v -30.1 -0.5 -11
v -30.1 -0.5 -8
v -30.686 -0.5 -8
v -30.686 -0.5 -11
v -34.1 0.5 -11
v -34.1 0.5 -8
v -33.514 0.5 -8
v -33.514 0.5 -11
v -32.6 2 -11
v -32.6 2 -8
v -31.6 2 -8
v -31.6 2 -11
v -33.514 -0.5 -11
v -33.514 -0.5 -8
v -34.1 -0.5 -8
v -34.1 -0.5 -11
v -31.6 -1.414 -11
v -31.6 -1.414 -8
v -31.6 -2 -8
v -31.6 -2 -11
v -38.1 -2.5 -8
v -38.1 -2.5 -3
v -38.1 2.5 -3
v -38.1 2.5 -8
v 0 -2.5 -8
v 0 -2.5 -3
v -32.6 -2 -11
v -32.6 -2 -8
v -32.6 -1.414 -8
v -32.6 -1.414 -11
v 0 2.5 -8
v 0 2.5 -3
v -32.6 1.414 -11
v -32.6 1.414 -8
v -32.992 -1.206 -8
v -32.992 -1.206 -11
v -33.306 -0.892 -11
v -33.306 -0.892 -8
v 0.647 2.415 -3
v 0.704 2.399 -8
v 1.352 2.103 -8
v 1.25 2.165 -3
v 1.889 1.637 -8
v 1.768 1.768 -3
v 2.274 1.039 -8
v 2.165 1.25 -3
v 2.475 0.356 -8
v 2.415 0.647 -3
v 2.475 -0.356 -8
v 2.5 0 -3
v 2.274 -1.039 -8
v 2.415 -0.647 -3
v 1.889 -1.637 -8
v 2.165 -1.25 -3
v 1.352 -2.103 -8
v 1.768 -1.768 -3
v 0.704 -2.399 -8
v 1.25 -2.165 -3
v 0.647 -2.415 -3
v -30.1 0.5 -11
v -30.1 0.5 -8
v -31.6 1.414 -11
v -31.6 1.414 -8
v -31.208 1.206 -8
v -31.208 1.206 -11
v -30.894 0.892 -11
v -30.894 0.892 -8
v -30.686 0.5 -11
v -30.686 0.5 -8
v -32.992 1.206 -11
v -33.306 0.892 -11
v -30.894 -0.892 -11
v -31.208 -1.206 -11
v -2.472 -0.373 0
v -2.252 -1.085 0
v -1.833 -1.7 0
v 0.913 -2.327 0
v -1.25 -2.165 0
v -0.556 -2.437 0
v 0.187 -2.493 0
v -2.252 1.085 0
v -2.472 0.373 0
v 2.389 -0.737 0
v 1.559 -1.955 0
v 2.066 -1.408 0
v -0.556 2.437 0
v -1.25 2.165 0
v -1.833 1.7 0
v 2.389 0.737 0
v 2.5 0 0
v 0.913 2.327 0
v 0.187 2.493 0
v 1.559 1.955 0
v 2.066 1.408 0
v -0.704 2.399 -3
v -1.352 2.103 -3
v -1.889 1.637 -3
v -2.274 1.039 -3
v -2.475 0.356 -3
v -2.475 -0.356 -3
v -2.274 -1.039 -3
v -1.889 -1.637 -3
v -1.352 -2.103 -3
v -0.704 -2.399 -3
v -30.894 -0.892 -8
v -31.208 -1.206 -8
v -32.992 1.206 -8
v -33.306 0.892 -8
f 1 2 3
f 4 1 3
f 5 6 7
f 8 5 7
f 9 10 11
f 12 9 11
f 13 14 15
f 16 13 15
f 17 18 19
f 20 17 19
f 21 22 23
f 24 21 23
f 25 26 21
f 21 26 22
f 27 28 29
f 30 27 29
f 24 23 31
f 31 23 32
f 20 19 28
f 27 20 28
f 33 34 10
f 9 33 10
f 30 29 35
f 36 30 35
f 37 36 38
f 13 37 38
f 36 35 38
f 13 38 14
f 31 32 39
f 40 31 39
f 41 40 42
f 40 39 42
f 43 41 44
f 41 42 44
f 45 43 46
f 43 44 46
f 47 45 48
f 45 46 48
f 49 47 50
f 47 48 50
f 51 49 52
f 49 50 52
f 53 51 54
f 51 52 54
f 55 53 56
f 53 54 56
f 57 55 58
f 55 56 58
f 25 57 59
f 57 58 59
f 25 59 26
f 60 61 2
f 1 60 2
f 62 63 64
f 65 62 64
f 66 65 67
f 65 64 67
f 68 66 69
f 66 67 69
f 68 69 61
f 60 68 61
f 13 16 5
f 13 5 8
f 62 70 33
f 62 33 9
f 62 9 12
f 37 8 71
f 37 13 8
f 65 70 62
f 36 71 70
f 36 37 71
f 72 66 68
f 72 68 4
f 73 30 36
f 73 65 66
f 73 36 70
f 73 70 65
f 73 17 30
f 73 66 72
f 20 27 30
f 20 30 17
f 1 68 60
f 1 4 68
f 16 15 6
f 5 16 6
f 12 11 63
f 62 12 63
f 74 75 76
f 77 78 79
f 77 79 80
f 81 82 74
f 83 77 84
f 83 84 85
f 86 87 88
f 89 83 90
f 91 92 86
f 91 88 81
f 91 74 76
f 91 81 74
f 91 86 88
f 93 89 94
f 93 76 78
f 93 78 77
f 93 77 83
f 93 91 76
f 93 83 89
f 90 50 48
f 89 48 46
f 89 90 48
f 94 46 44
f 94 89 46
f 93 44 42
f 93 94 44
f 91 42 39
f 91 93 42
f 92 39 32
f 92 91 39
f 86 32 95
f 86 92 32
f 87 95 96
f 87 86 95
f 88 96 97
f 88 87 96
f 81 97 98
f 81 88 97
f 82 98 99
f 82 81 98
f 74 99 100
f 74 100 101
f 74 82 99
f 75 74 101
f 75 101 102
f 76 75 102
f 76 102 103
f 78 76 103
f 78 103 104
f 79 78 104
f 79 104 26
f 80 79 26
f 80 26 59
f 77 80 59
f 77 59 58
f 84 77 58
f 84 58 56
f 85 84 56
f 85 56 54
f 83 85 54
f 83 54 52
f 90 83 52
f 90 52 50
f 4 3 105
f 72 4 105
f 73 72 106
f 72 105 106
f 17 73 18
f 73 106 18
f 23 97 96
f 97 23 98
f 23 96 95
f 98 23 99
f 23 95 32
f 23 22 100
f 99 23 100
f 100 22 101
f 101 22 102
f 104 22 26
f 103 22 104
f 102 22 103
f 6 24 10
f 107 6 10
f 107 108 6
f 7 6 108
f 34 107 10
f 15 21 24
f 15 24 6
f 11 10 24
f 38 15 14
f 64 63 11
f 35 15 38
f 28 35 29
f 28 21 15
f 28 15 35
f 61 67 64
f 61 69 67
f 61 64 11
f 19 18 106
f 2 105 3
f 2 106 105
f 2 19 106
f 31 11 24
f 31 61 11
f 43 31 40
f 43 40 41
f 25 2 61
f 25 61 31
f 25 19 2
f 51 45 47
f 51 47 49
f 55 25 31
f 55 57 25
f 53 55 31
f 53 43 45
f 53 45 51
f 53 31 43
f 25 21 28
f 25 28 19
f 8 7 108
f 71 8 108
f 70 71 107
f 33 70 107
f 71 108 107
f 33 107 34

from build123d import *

# Parameters (mm, degrees)
F0_R     = 2.5
F1_DEPTH = 3
F3_DEPTH = 5
F5_DEPTH = 3


with BuildPart() as f1:
    # F0 (on Top) → F1 (new body)
    with BuildSketch(Plane.XY):
        Circle(F0_R)
    extrude(amount=-F1_DEPTH)

    # F2 (on face) → F3 (join)
    with BuildSketch(Plane(origin=(0, 0, -3), x_dir=(1, 0, 0), z_dir=(0, 0, -1))):
        with BuildLine():
            Line((-38.1, -2.5), (0, -2.5))
            ThreePointArc((0, -2.5), (2.5, 0), (0, 2.5))
            Line((0, 2.5), (-38.1, 2.5))
            Line((-38.1, 2.5), (-38.1, -2.5))
        make_face()
    extrude(amount=F3_DEPTH)

    # F4 (on face) → F5 (join)
    with BuildSketch(Plane(origin=(0, 0, -8), x_dir=(1, 0, 0), z_dir=(0, 0, -1))):
        with BuildLine():
            Line((-32.6, 2), (-32.6, 1.414214))
            ThreePointArc((-32.6, 1.414214), (-33.16066, 1.06066), (-33.514214, 0.5))
            Line((-33.514214, 0.5), (-34.1, 0.5))
            Line((-34.1, 0.5), (-34.1, -0.5))
            Line((-34.1, -0.5), (-33.514214, -0.5))
            ThreePointArc((-33.514214, -0.5), (-33.16066, -1.06066), (-32.6, -1.414214))
            Line((-32.6, -1.414214), (-32.6, -2))
            Line((-32.6, -2), (-31.6, -2))
            Line((-31.6, -2), (-31.6, -1.414214))
            ThreePointArc((-31.6, -1.414214), (-31.03934, -1.06066), (-30.685786, -0.5))
            Line((-30.685786, -0.5), (-30.1, -0.5))
            Line((-30.1, -0.5), (-30.1, 0.5))
            Line((-30.1, 0.5), (-30.685786, 0.5))
            ThreePointArc((-30.685786, 0.5), (-31.03934, 1.06066), (-31.6, 1.414214))
            Line((-31.6, 1.414214), (-31.6, 2))
            Line((-31.6, 2), (-32.6, 2))
        make_face()
    extrude(amount=F5_DEPTH)


solid = f1.part
